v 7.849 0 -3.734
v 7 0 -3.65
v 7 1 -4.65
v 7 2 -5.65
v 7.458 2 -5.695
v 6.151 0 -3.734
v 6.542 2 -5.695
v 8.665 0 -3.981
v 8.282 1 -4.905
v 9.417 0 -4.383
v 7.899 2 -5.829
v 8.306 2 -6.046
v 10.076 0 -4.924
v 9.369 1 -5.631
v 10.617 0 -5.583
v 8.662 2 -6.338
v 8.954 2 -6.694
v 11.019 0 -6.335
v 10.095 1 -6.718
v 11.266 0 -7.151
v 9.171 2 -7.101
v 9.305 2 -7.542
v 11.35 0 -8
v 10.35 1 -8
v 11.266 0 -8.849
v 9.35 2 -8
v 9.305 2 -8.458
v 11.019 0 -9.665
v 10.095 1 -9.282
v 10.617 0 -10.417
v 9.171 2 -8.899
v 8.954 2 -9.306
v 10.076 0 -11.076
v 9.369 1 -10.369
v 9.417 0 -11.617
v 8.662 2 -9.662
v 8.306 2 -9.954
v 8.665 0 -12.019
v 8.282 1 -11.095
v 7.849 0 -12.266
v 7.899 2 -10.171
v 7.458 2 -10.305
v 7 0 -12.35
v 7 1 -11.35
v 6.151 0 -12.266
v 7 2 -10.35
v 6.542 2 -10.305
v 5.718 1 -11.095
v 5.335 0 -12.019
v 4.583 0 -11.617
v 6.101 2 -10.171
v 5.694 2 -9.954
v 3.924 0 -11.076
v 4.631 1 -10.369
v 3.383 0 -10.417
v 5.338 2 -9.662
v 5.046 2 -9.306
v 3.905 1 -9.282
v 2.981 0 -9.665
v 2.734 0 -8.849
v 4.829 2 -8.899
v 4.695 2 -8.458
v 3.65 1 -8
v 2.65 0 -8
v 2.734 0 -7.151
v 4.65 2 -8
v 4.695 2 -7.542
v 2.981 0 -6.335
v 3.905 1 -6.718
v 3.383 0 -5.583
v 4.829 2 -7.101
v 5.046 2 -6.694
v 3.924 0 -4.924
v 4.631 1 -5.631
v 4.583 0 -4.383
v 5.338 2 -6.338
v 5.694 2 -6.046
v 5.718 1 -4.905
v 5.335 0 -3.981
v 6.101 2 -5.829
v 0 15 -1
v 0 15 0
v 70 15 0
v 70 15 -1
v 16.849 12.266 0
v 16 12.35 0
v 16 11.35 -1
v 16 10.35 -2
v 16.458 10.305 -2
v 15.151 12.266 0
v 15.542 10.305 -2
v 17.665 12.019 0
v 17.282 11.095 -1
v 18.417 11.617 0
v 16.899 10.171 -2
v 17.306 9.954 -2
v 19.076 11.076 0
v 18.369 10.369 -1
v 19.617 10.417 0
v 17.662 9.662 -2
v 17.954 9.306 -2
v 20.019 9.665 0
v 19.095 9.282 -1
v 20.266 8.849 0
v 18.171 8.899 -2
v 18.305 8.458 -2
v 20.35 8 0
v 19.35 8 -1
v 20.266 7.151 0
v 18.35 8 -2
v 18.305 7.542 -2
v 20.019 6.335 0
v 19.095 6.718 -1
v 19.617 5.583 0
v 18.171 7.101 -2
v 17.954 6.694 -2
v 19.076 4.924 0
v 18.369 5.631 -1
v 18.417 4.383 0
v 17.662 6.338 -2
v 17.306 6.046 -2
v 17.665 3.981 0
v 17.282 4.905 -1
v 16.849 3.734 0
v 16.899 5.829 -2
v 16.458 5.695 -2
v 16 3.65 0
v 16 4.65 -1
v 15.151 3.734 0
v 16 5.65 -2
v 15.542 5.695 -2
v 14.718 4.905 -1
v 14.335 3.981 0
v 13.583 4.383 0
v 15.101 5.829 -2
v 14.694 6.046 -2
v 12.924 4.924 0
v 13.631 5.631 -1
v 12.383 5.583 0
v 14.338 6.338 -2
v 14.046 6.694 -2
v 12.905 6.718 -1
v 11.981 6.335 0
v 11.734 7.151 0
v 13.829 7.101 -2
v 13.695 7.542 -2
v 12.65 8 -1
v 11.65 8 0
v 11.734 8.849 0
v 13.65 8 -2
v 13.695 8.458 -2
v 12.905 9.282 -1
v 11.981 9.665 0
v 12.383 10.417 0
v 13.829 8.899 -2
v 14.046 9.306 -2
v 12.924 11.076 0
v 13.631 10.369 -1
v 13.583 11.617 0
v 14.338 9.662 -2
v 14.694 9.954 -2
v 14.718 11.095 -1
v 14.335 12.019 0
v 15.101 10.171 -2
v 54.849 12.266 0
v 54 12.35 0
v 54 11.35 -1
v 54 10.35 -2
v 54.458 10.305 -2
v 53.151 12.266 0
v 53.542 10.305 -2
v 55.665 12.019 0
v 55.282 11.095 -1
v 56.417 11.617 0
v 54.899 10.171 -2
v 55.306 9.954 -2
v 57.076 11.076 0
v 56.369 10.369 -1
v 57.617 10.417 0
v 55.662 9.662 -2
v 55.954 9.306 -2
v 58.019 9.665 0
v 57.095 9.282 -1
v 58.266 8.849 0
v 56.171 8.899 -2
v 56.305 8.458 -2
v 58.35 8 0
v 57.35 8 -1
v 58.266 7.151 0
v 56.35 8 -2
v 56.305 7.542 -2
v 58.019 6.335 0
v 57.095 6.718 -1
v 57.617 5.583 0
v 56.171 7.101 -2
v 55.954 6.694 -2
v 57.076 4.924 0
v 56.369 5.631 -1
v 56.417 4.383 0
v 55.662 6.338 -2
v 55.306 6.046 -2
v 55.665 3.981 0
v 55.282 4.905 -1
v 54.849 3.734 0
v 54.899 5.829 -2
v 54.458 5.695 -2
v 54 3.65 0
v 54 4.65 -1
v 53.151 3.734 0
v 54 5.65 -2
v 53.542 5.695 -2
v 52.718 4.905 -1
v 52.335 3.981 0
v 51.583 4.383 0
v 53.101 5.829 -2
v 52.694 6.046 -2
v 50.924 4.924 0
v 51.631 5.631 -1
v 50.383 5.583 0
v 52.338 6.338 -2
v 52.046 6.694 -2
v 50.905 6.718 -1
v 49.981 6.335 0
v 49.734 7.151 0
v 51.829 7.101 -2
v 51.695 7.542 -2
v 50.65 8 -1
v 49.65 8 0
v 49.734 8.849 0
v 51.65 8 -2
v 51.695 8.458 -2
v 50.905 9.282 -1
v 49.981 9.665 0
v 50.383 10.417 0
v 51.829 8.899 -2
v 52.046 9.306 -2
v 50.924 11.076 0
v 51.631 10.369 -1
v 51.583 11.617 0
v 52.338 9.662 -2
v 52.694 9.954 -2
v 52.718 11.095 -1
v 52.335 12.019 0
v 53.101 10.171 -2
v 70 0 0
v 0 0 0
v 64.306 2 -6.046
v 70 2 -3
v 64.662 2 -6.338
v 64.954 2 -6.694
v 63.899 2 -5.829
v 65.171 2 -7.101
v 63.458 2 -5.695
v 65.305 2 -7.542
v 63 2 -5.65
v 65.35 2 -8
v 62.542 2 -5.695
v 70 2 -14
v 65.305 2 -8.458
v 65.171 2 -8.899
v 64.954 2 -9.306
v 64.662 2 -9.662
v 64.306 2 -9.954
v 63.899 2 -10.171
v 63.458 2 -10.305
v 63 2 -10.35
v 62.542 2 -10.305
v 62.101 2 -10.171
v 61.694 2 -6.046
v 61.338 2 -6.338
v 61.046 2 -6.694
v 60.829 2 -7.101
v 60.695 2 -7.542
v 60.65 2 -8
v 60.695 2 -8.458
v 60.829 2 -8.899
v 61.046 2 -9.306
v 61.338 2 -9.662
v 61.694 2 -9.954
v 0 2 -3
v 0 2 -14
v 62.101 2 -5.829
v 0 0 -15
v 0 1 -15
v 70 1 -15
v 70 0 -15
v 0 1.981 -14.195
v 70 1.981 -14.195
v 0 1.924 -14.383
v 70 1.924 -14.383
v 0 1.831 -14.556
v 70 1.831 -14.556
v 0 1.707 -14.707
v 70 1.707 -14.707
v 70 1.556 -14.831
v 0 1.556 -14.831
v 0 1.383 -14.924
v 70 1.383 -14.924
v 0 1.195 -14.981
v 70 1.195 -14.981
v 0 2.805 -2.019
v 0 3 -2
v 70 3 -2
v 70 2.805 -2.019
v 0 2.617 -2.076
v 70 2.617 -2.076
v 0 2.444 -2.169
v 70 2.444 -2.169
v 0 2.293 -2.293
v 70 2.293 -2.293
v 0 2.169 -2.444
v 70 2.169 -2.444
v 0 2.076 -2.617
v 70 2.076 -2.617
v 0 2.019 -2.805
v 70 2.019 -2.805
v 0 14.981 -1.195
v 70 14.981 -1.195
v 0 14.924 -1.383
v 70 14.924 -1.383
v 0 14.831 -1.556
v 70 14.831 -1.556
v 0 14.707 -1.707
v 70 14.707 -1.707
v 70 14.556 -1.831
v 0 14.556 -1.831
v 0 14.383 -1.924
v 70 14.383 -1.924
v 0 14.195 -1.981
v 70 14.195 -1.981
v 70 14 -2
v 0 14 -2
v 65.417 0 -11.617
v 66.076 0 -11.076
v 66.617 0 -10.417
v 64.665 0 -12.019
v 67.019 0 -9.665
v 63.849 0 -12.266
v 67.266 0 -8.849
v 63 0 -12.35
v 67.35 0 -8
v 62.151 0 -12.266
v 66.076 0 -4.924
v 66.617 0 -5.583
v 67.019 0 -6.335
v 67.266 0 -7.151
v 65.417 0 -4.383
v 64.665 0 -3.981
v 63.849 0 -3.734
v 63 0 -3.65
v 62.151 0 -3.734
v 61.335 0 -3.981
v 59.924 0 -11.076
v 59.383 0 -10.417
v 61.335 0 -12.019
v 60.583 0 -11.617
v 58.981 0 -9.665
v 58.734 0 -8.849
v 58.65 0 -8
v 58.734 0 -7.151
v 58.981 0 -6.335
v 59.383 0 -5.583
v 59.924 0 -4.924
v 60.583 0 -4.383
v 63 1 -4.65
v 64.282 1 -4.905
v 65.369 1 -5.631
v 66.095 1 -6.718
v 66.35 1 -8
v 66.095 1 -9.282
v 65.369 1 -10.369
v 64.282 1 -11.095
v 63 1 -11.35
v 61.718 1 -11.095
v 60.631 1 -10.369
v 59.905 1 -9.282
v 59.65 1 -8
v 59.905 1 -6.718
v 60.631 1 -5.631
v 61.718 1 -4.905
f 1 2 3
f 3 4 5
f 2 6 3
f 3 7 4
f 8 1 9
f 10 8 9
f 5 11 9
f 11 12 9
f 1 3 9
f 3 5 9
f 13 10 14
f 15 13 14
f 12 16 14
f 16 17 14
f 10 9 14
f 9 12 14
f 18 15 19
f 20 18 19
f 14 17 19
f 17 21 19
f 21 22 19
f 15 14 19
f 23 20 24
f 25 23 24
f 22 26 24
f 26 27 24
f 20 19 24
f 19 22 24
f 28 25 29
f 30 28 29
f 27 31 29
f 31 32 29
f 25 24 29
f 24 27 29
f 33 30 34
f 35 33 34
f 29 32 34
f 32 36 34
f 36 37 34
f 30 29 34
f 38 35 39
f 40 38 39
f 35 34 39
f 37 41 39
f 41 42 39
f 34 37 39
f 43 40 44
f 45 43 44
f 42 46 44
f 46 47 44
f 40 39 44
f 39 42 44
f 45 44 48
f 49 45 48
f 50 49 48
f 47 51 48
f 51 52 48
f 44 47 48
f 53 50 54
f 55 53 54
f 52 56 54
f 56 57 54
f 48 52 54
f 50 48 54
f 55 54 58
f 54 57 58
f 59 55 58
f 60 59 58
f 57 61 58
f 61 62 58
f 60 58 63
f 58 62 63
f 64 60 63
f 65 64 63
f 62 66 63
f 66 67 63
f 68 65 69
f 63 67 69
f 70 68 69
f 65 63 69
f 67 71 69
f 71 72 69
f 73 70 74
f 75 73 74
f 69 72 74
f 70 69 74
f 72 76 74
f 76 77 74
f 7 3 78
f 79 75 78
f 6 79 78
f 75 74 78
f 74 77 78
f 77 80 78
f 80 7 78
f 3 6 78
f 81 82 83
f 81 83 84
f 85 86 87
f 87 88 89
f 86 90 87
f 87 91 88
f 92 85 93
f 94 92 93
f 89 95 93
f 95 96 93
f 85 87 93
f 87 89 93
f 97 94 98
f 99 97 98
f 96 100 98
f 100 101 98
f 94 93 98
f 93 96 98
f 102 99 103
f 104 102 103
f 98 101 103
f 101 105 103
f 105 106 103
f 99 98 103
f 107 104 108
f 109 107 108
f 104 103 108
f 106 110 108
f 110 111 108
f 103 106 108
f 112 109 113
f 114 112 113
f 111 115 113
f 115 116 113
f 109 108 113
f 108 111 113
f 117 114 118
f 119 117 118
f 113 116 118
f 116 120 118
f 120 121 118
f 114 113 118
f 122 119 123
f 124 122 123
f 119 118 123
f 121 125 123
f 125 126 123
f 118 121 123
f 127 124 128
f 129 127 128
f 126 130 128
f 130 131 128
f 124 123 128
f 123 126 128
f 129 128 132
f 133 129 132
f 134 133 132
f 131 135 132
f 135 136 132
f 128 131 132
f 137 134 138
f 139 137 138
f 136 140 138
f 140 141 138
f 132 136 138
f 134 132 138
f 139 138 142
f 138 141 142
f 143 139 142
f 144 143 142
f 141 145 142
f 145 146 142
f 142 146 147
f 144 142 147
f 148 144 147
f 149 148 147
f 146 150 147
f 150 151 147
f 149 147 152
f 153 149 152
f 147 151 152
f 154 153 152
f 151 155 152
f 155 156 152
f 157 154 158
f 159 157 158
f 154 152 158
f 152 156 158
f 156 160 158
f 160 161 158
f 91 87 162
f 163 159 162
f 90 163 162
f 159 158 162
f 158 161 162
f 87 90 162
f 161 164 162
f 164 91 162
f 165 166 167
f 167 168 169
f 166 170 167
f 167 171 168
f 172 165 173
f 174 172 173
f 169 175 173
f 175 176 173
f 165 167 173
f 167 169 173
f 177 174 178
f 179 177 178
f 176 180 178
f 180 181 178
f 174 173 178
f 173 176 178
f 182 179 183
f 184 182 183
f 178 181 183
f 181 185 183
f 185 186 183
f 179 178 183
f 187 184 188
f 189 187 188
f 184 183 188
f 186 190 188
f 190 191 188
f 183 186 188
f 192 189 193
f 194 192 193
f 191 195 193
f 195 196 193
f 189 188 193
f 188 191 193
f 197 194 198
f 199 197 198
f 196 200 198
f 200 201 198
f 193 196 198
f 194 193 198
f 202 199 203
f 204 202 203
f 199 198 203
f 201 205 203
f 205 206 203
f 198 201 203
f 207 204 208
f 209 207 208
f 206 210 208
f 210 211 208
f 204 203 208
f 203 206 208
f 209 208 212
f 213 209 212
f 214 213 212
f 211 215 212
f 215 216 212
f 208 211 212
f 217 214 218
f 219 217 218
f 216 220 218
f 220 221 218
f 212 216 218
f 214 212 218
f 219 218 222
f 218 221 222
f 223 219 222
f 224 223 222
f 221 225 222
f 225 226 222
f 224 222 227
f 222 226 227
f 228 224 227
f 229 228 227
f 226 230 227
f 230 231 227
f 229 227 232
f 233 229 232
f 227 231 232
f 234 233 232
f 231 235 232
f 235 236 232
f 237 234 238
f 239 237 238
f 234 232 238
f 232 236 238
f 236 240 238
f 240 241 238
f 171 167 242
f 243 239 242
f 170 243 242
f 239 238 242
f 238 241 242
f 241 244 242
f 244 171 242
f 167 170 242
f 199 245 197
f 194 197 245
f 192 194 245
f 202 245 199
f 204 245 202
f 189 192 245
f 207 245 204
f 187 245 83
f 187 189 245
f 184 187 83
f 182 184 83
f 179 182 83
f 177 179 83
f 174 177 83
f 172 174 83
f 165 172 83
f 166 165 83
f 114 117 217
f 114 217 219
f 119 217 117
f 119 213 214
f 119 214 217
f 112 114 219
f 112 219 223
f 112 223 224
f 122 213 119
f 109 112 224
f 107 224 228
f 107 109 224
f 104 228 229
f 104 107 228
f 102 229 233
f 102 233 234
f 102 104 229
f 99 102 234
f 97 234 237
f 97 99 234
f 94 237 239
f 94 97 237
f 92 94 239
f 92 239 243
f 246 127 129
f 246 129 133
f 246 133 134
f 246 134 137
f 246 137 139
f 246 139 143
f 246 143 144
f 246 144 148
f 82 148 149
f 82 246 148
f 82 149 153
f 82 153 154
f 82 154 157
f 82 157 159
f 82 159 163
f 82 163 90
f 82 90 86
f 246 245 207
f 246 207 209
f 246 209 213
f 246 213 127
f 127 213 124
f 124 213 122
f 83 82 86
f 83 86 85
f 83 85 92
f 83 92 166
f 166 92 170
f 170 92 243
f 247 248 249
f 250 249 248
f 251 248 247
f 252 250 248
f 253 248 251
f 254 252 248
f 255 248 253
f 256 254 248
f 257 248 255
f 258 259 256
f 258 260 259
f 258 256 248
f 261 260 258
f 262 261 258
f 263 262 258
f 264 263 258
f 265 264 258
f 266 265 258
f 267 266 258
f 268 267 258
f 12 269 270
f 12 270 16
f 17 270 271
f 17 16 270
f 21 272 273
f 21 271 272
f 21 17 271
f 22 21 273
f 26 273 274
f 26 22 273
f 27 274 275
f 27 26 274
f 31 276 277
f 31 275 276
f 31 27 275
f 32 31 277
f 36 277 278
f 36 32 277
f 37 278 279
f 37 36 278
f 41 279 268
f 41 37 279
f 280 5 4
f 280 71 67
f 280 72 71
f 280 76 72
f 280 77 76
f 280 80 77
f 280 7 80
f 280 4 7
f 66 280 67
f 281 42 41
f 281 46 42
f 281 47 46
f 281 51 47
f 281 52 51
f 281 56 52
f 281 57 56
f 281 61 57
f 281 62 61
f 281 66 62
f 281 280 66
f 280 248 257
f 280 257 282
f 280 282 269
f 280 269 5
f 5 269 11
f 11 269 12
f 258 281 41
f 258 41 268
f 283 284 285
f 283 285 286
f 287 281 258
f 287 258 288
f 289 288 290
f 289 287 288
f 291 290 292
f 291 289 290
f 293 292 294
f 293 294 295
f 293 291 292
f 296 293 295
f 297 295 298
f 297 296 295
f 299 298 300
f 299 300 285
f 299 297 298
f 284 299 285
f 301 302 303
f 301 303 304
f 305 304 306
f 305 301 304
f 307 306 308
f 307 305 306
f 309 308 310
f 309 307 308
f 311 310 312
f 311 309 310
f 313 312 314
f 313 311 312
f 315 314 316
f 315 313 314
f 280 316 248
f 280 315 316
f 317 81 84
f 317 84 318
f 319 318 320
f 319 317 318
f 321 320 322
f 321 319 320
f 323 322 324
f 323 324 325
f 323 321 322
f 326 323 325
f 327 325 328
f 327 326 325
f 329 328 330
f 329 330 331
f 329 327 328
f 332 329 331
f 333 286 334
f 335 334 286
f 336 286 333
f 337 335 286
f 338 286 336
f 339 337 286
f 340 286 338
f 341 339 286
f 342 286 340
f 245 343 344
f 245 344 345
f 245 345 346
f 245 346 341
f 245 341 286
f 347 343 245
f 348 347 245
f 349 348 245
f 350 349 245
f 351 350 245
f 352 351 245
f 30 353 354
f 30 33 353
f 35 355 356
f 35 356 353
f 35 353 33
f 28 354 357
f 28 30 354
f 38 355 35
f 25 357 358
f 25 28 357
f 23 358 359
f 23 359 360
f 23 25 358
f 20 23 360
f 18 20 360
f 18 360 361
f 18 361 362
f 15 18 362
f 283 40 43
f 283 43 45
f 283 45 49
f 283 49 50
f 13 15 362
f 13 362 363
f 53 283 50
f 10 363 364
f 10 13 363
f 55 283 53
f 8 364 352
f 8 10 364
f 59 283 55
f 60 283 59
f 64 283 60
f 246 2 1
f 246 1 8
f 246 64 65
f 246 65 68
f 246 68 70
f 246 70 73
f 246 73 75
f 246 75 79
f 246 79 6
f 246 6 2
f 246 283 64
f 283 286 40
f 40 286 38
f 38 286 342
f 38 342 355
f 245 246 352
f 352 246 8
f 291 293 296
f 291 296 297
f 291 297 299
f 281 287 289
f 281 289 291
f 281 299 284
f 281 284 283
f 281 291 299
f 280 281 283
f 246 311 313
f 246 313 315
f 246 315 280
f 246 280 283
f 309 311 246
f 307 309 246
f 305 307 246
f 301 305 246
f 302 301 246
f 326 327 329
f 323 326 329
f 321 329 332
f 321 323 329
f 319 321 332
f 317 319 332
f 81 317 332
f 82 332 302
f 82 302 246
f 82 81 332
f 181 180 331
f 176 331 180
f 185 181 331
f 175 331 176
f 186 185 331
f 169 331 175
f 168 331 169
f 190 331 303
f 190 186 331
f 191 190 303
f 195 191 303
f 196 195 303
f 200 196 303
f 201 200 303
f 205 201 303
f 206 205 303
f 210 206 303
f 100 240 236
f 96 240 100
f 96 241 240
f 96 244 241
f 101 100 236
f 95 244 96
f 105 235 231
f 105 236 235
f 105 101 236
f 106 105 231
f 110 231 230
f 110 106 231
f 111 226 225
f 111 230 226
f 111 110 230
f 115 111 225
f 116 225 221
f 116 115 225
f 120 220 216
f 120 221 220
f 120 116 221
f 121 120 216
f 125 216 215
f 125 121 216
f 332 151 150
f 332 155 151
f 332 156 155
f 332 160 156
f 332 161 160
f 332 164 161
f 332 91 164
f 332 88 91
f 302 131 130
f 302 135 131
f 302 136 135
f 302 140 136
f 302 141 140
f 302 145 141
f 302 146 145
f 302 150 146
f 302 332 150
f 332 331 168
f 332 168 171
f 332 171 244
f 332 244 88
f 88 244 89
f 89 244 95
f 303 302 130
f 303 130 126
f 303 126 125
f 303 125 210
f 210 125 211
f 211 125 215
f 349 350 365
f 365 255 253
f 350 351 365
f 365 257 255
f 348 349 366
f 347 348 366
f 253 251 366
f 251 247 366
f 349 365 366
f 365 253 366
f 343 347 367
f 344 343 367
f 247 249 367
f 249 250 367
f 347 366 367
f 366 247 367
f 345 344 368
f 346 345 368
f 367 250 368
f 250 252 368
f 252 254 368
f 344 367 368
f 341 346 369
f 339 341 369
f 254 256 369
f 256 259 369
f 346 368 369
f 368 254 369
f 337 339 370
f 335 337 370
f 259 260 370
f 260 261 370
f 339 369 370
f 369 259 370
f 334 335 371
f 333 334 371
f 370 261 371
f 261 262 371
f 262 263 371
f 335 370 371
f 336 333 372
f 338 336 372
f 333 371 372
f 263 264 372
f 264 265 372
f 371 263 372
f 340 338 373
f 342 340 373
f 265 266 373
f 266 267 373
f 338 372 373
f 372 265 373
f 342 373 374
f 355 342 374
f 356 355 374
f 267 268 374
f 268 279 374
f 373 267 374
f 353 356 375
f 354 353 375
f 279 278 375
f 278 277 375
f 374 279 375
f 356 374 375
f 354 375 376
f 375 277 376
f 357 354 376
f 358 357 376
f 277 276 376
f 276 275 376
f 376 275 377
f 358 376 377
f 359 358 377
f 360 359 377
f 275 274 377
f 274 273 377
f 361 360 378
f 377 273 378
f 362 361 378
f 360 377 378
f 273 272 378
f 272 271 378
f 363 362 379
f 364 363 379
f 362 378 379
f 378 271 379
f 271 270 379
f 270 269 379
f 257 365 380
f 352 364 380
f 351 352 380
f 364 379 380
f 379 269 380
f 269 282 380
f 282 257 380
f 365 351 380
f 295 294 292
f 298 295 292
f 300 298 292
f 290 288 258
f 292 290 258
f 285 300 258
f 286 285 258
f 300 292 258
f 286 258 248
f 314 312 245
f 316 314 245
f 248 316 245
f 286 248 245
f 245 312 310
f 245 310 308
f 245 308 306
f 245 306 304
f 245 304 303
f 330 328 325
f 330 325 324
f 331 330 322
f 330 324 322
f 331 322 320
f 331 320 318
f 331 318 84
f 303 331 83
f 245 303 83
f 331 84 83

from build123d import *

# Parameters (mm, degrees)
EXTRUDE_1_DEPTH     = 70
SKETCH_2_R          = 2.3
CUT_EXTRUDE_1_DEPTH = 73.759879054
SKETCH_3_R          = 2.3
CUT_EXTRUDE_2_DEPTH = 73.759879054
CHAMFER_1_SIZE      = 2.05


with BuildPart() as part:
    # Эскиз1 → Бобышка-Вытянуть1 (new body)
    with BuildSketch(Plane(origin=(0, 0, 0), x_dir=(0, 0, -1), z_dir=(1, 0, 0))):
        with BuildLine():
            Line((0, 0), (0, 15))
            Line((0, 15), (1, 15))
            ThreePointArc((1, 15), (1.707106781, 14.707106781), (2, 14))
            Line((2, 14), (2, 3))
            ThreePointArc((2, 3), (2.292893219, 2.292893219), (3, 2))
            Line((3, 2), (14, 2))
            ThreePointArc((14, 2), (14.707106781, 1.707106781), (15, 1))
            Line((15, 1), (15, 0))
            Line((15, 0), (0, 0))
        make_face()
    extrude(amount=EXTRUDE_1_DEPTH)

    # Эскиз2 → Вырез-Вытянуть1 (cut, through all)
    with BuildSketch(Plane(origin=(0, 2, 0), x_dir=(1, 0, 0), z_dir=(0, 1, 0))):
        with Locations(Location((7, 8, 0), (0, 0, 270))):
            Circle(SKETCH_2_R)
        with Locations(Location((63, 8, 0), (0, 0, 270))):
            Circle(SKETCH_2_R)
    extrude(amount=-CUT_EXTRUDE_1_DEPTH, mode=Mode.SUBTRACT)

    # Эскиз3 → Вырез-Вытянуть2 (cut, through all)
    with BuildSketch(Plane(origin=(0, 0, -2), x_dir=(-1, 0, 0), z_dir=(0, 0, -1))):
        with Locations(Location((-16, 8, 0), (0, 0, 90))):
            Circle(SKETCH_3_R)
        with Locations(Location((-54, 8, 0), (0, 0, 90))):
            Circle(SKETCH_3_R)
    extrude(amount=-CUT_EXTRUDE_2_DEPTH, mode=Mode.SUBTRACT)

    # Фаска1
    # the kernel refuses this chamfer: 2.05 mm, written as the material it takes off along each edge
    with BuildSketch(Plane(origin=(63, 0, -8), x_dir=(0, 0, 1), z_dir=(-1, 0, 0))) as chamfer_1_piece_1:
        Polygon((2.3 + CHAMFER_1_SIZE, 0), (2.3, CHAMFER_1_SIZE), (2.3, 0), align=None)
    revolve(axis=Axis((63, 0, -8), (0, 1, 0)), mode=Mode.SUBTRACT)
    with BuildSketch(Plane(origin=(7, 0, -8), x_dir=(0, 0, 1), z_dir=(-1, 0, 0))) as chamfer_1_piece_2:
        Polygon((2.3 + CHAMFER_1_SIZE, 0), (2.3, CHAMFER_1_SIZE), (2.3, 0), align=None)
    revolve(axis=Axis((7, 0, -8), (0, 1, 0)), mode=Mode.SUBTRACT)
    with BuildSketch(Plane(origin=(54, 8, 0), x_dir=(0, 1, 0), z_dir=(-1, 0, 0))) as chamfer_1_piece_3:
        Polygon((2.3 + CHAMFER_1_SIZE, 0), (2.3, CHAMFER_1_SIZE), (2.3, 0), align=None)
    revolve(axis=Axis((54, 8, 0), (0, 0, -1)), mode=Mode.SUBTRACT)
    with BuildSketch(Plane(origin=(16, 8, 0), x_dir=(0, 1, 0), z_dir=(-1, 0, 0))) as chamfer_1_piece_4:
        Polygon((2.3 + CHAMFER_1_SIZE, 0), (2.3, CHAMFER_1_SIZE), (2.3, 0), align=None)
    revolve(axis=Axis((16, 8, 0), (0, 0, -1)), mode=Mode.SUBTRACT)


solid = part.part
